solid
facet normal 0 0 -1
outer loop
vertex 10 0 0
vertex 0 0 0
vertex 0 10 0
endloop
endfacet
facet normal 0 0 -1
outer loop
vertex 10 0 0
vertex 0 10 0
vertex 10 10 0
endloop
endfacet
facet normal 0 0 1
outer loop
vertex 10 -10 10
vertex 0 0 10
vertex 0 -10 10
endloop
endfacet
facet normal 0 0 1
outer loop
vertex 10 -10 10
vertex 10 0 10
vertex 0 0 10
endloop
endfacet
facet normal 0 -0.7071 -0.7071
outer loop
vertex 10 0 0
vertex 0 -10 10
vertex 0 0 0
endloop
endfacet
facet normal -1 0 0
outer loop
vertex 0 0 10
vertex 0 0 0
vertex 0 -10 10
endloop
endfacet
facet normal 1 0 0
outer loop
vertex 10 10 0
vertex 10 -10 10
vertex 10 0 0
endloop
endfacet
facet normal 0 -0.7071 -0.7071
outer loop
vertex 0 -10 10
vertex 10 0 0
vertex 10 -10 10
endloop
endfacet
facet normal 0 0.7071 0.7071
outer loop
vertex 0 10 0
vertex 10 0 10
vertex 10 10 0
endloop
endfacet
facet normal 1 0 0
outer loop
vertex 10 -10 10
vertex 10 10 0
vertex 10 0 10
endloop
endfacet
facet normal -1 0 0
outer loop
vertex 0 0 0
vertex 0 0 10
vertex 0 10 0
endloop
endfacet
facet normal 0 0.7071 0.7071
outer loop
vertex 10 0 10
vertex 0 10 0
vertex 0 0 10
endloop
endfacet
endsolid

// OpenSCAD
// With twist, segments= replaces the default $fs/$fa based subdivision
// (which would split each side into 5): 8 vertices per ring.
linear_extrude(height = 10, twist = 90, slices = 1, segments = 8) square(10);
